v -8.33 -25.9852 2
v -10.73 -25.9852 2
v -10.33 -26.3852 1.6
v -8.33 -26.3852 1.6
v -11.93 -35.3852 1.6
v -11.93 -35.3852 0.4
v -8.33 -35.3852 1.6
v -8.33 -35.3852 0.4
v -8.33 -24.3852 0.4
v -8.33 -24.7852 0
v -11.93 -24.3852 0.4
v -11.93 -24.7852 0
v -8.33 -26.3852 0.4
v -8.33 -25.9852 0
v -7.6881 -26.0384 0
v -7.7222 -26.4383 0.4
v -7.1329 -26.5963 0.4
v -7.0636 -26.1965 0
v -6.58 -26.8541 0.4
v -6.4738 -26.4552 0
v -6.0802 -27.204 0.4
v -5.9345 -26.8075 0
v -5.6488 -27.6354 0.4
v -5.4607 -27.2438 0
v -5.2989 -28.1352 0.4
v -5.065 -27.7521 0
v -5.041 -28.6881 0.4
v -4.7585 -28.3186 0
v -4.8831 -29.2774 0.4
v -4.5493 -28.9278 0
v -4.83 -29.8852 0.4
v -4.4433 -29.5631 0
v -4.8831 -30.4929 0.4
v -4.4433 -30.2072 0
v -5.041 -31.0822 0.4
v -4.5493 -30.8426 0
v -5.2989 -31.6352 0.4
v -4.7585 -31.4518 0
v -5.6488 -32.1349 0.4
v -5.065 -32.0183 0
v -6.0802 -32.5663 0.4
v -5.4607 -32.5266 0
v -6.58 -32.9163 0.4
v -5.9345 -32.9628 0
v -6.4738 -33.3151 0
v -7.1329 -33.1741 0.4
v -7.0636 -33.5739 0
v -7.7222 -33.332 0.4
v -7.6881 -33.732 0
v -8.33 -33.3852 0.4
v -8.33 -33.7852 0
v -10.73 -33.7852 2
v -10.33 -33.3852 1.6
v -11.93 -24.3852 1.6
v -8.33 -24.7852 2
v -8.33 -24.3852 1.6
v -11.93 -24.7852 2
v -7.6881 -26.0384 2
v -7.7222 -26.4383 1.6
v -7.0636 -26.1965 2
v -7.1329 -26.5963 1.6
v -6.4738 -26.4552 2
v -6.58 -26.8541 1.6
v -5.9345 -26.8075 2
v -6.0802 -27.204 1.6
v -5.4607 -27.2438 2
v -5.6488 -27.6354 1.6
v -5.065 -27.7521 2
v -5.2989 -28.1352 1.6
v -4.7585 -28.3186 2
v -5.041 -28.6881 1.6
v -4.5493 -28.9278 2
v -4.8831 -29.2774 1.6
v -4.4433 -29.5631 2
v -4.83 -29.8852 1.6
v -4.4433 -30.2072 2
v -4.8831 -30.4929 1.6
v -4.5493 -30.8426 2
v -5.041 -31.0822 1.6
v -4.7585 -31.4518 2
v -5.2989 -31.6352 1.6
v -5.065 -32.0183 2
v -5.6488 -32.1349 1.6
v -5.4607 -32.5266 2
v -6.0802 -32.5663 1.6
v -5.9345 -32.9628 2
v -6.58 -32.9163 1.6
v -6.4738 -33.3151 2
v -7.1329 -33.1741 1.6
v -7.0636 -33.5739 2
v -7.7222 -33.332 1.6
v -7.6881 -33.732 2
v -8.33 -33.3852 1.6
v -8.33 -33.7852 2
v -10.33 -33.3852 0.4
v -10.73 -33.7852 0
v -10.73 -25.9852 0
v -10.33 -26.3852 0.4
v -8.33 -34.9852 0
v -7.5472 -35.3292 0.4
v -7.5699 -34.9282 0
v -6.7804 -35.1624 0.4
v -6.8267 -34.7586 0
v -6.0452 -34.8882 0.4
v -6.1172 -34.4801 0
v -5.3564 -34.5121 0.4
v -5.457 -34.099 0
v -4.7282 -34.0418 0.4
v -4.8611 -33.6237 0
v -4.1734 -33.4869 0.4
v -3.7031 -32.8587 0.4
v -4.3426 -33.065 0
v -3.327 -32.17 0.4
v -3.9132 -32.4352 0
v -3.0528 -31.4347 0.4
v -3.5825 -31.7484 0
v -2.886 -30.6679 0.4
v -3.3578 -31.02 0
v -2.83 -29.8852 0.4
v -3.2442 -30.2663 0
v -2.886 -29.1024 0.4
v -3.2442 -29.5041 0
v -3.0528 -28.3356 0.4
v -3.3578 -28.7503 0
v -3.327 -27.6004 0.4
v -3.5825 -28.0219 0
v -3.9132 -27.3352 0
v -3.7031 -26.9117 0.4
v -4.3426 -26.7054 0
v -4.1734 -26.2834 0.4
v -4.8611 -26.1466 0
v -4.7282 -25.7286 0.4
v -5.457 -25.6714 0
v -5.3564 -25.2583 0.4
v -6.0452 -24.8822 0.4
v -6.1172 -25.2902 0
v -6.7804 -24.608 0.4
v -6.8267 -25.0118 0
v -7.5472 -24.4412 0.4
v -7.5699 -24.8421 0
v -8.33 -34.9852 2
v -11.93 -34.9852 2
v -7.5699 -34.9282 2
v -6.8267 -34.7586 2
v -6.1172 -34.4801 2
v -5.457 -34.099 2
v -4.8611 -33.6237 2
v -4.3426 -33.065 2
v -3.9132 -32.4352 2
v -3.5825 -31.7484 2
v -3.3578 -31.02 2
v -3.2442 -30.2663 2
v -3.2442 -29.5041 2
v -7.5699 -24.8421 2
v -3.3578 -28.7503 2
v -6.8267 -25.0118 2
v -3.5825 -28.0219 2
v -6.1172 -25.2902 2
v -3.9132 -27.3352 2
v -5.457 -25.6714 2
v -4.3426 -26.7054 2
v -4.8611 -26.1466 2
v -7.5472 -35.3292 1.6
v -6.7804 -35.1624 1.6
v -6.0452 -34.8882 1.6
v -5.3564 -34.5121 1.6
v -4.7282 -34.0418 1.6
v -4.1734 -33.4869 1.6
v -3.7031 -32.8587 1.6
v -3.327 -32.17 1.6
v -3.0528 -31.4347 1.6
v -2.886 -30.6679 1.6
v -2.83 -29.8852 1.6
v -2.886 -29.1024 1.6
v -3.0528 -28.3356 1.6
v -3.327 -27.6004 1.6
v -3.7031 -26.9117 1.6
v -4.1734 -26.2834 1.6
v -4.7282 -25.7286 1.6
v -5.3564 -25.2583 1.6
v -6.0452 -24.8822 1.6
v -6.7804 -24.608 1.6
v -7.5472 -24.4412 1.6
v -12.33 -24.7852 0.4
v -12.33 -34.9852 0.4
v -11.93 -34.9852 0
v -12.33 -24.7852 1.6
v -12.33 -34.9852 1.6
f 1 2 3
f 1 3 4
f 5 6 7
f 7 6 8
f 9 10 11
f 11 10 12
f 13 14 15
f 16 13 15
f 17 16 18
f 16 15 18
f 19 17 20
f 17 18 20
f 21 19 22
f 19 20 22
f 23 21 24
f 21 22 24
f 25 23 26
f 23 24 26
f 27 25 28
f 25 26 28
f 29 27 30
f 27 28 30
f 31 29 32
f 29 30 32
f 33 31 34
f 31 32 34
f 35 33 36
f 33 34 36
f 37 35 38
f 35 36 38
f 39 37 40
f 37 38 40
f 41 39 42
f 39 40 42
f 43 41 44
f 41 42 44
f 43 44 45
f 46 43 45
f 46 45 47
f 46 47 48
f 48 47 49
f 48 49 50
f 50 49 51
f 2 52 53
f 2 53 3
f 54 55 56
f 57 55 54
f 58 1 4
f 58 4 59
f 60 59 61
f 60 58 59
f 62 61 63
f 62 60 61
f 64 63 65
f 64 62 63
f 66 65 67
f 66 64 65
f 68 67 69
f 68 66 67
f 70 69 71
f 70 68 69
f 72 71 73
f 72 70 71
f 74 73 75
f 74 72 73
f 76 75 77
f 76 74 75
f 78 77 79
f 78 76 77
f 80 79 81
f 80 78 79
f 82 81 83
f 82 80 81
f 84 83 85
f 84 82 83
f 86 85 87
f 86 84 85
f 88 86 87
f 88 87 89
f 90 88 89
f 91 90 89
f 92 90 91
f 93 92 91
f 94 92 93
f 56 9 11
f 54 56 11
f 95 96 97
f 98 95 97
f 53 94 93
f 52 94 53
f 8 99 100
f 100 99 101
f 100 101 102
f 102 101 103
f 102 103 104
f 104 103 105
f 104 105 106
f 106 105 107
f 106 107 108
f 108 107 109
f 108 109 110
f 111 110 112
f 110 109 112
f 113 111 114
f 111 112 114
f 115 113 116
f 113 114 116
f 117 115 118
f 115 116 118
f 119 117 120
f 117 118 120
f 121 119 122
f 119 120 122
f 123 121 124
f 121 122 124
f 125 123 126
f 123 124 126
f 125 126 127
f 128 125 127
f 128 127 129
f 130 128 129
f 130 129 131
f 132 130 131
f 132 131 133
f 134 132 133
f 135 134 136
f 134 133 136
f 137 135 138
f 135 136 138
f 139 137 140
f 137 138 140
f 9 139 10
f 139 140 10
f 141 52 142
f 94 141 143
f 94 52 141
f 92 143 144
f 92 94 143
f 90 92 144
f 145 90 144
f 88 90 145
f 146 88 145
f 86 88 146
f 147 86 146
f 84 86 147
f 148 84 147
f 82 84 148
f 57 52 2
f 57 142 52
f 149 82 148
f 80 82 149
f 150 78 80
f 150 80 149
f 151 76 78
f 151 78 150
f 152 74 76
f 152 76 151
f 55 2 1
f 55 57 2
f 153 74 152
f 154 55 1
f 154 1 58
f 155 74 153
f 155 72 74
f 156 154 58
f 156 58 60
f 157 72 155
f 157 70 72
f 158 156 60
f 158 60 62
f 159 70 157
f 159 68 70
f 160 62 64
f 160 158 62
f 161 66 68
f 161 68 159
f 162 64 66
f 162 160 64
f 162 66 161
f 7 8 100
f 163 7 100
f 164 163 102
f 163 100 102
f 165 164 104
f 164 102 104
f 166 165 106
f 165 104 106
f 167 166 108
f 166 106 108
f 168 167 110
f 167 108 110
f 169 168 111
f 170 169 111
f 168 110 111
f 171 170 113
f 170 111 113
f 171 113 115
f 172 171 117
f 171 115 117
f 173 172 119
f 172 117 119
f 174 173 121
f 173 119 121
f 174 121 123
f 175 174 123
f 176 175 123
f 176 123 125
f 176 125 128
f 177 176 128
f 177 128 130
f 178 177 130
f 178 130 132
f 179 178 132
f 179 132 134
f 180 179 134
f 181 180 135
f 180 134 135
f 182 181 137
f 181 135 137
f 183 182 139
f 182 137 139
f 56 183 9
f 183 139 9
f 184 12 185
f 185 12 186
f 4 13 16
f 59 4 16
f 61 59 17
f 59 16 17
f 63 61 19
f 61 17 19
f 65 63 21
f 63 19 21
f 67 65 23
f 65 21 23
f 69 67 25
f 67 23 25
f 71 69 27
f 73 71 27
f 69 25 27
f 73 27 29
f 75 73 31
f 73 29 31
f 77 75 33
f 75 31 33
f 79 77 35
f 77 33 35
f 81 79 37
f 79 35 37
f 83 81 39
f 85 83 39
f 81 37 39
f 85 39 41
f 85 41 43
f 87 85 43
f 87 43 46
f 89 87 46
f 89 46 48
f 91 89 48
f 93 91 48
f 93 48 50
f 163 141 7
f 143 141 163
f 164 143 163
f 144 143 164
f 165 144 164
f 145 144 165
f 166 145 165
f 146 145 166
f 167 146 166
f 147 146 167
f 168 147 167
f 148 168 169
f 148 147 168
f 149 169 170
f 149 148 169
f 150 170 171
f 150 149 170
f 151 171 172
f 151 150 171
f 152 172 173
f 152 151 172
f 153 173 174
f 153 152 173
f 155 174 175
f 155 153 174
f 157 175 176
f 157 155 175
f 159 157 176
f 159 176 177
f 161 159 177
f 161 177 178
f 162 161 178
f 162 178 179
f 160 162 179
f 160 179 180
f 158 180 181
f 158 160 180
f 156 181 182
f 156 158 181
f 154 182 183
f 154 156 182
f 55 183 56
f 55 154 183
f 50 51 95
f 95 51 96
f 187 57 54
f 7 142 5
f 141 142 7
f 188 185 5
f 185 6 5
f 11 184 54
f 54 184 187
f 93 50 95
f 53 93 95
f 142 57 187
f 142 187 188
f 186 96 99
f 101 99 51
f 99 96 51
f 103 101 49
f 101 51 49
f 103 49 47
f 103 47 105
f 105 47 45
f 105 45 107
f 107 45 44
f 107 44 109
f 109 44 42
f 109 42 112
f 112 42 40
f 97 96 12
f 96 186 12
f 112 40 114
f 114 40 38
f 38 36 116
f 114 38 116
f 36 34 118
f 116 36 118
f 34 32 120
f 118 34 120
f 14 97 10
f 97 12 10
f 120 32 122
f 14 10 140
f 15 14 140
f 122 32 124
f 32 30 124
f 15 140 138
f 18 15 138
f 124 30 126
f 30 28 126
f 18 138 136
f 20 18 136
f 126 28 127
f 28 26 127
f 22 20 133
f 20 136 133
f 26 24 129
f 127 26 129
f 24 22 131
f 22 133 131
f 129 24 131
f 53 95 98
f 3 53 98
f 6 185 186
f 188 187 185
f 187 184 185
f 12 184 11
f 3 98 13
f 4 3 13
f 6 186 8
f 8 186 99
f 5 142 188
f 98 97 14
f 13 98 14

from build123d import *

# Parameters (mm, degrees)
F1_DEPTH = 2
F2_SIZE  = 0.4


# Not quite as in the source:
# - a feature names something its author has since deleted; it is built from what else it names


with BuildPart() as f1:
    # F0 (on Top) → F1 (new body)
    with BuildSketch(Plane.XY):
        with BuildLine():
            Line((-8.3299736083, -24.3851770833), (-12.3299736083, -24.3851770833))
            Line((-12.3299736083, -24.3851770833), (-12.3299736083, -35.3851770833))
            Line((-12.3299736083, -35.3851770833), (-8.3299736083, -35.3851770833))
            ThreePointArc((-8.3299736083, -35.3851770833), (-2.8299736083, -29.8851770833), (-8.3299736083, -24.3851770833))
        make_face()
        with BuildLine():
            Line((-10.3299736083, -33.3851770833), (-10.3299736083, -26.3851770833))
            Line((-10.3299736083, -26.3851770833), (-8.3299736083, -26.3851770833))
            ThreePointArc((-8.3299736083, -26.3851770833), (-4.8299736083, -29.8851770833), (-8.3299736083, -33.3851770833))
            Line((-8.3299736083, -33.3851770833), (-10.3299736083, -33.3851770833))
        make_face(mode=Mode.SUBTRACT)
    extrude(amount=F1_DEPTH)

    # F2
    f2_edges = [f1.edges().sort_by_distance(p)[0] for p in [
        (-9.329974, -33.385177, 2),
        (-10.329974, -29.885177, 2),
        (-9.329974, -26.385177, 2),
        (-10.329974, -35.385177, 2),
        (-12.329974, -29.885177, 2),
        (-12.329974, -35.385177, 1),
        (-10.329974, -24.385177, 2),
        (-12.329974, -24.385177, 1),
        (-12.329974, -29.885177, 0),
        (-10.329974, -29.885177, 0),
        (-9.329974, -26.385177, 0),
        (-10.329974, -24.385177, 0),
        (-9.329974, -33.385177, 0),
        (-10.329974, -35.385177, 0),
        (-2.829974, -29.885177, 0),
        (-2.829974, -29.885177, 2),
        (-4.829974, -29.885177, 0),
        (-4.829974, -29.885177, 2),
    ]]
    chamfer(f2_edges, length=F2_SIZE)


solid = f1.part
